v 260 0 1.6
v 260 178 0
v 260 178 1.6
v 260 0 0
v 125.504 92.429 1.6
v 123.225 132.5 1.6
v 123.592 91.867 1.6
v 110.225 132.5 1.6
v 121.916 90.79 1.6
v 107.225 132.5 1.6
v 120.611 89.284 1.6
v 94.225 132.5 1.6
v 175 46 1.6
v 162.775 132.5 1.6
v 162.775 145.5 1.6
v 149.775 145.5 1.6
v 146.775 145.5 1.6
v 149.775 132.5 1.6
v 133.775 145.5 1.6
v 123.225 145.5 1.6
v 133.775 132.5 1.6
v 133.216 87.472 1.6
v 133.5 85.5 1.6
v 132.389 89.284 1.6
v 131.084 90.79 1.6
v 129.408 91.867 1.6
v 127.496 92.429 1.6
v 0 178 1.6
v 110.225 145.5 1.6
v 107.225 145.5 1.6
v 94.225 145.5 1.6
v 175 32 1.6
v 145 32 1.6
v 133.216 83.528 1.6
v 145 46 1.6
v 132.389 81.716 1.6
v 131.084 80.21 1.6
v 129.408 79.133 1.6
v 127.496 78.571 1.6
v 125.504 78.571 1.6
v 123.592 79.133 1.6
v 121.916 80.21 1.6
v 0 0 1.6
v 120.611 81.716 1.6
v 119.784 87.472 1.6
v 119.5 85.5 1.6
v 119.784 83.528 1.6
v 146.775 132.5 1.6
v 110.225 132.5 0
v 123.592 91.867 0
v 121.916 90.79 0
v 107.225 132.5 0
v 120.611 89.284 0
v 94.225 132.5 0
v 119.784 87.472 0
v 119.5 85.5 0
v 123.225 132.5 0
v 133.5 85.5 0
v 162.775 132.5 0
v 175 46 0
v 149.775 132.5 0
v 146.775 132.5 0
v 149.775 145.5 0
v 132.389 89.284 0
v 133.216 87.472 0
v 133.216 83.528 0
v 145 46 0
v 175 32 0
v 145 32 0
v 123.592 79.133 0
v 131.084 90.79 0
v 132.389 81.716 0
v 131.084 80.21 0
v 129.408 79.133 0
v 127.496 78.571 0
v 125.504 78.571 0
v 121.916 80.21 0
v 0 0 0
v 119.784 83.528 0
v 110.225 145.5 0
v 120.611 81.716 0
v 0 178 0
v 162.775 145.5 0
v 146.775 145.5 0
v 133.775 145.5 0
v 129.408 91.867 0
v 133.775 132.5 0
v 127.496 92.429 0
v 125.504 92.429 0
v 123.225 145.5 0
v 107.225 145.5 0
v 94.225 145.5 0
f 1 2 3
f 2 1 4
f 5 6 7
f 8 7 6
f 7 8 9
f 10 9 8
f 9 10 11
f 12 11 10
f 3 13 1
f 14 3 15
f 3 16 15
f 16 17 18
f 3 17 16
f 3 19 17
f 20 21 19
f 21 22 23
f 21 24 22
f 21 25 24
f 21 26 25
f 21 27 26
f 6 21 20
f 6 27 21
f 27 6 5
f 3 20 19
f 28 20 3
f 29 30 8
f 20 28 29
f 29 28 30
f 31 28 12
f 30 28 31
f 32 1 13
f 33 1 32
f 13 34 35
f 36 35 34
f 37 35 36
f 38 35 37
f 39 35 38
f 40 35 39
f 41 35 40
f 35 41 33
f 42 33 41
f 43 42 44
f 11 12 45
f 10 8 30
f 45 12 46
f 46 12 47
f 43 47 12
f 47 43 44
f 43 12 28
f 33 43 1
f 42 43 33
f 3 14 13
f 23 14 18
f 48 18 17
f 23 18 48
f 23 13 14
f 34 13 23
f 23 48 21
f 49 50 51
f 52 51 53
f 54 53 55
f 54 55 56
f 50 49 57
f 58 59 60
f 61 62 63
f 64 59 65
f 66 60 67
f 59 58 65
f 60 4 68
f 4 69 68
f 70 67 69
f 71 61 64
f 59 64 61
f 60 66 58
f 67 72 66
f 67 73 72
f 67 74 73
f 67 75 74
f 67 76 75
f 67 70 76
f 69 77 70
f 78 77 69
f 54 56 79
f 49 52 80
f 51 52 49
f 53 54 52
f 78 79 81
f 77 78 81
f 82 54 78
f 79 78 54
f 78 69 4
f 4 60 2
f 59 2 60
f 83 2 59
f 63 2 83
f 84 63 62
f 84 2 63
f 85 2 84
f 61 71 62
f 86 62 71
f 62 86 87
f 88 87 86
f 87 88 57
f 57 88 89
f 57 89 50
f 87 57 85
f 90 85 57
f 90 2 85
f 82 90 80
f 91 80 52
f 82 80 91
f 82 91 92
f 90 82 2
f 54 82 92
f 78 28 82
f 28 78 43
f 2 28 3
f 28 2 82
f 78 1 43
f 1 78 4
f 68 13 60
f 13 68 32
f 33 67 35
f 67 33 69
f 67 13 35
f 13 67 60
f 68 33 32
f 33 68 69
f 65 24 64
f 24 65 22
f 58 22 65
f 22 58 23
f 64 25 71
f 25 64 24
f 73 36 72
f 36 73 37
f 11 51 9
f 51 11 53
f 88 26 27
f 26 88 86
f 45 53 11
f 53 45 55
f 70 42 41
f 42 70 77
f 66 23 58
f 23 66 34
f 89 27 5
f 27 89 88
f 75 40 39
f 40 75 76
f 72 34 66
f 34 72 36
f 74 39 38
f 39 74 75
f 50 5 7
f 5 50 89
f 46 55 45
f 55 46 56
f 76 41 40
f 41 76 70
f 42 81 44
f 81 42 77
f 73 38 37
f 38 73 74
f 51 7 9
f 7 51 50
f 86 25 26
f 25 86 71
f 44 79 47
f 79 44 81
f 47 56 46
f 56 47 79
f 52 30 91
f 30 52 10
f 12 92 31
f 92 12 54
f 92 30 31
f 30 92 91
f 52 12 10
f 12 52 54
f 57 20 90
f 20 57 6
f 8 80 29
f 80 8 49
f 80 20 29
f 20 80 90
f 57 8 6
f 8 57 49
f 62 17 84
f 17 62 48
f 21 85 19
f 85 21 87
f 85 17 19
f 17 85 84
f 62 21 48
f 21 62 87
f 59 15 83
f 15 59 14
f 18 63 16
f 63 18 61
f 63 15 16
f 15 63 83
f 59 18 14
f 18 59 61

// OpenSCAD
// All sizes are millimeters

// Global definitions
screw_cylinder_height = 8;
screw_cylinder_inner = 3;
screw_cylinder_outer = 4.5;

// Main plate 
surface_plate_width = 260;
surface_plate_height = 178;
surface_plate_thickness = 1.6;
surface_plate_xyz = [surface_plate_width,surface_plate_height, surface_plate_thickness];

// Display
display_width = 30;
display_height = 14;
display_thickness = 2;
display_size = [display_width, display_height, display_thickness];
display_distance_from_center_x = -30;
display_distance_from_center_y = 50;

// Volume knob
volume_knob_dia = 7;
volume_knob_position_x = (surface_plate_width / 2) - (volume_knob_dia / 2);
volume_knob_position_y = (surface_plate_height / 2) - (volume_knob_dia / 2);

// Button cuts
button_width = 13;
button_height = 13;
button_thickness = 2;
button_size = [button_width, button_height, button_thickness];
button_group_short_distance = 3;
button_group_big_distance = 13.55;
button_group_width_total = button_width * 4 + button_group_short_distance * 2 + button_group_big_distance;
button_group_position_x = (surface_plate_width / 2) - button_group_width_total / 2;
button_group_position_y = ((surface_plate_height / 2) - button_height / 2) + 50;

difference() {
    // Draw main plate
    cube(surface_plate_xyz);
    
    // Substract display
    translate ([surface_plate_width/2 - display_width /2 - 
    display_distance_from_center_x, 
    surface_plate_height/2 - display_height/2 - 
    display_distance_from_center_y])
    {
        cube(display_size);
    }
    
    // Substract volume knob
    translate([volume_knob_position_x, volume_knob_position_y]){
        cylinder(r=volume_knob_dia, h=2);
    }
    
    // Buttons
    translate([button_group_position_x, button_group_position_y])
    {
        cube(button_size);
    }
    
    translate([button_group_position_x + button_group_short_distance + button_width, button_group_position_y])
    {
        cube(button_size);
    }
    
    translate([button_group_position_x + button_group_big_distance + button_width * 2, button_group_position_y])
    {
        cube(button_size);
    }
    
    translate([button_group_position_x + button_group_short_distance + button_group_big_distance + button_width * 3, button_group_position_y])
    {
        cube(button_size);
    }
}

// draw screw holders display
/*translate ([surface_plate_width/2 - display_width /2 - 
    display_distance_from_center_x - 6, 
    surface_plate_height/2 - display_height/2 - 
    display_distance_from_center_y - 5]){
    difference(){
    cylinder(r=6, h=screw_cylinder_height);
        translate([screw_cylinder_outer/2 - screw_cylinder_inner /2]){
            cylinder(r=3, h=screw_cylinder_height);
        }
    }
}

translate ([surface_plate_width/2 - display_width /2 - 
    display_distance_from_center_x - 6, 
    surface_plate_height/2 + display_height/2 - 
    display_distance_from_center_y + 4]){
    difference(){
    cylinder(r=6, h=screw_cylinder_height);
        translate([screw_cylinder_outer/2 - screw_cylinder_inner /2]){
            cylinder(r=3, h=screw_cylinder_height);
        }
    }
}

translate ([surface_plate_width/2 + display_width /2 - 
    display_distance_from_center_x + 4, 
    surface_plate_height/2 + display_height/2 - 
    display_distance_from_center_y + 5]){
    difference(){
    cylinder(r=6, h=screw_cylinder_height);
        translate([screw_cylinder_outer/2 - screw_cylinder_inner /2]){
            cylinder(r=3, h=screw_cylinder_height);
        }
    }
}

translate ([surface_plate_width/2 + display_width /2 - 
    display_distance_from_center_x + 4, 
    surface_plate_height/2 - display_height/2 - 
    display_distance_from_center_y - 5]){
    difference(){
    cylinder(r=6, h=screw_cylinder_height);
        translate([screw_cylinder_outer/2 - screw_cylinder_inner /2]){
            cylinder(r=3, h=screw_cylinder_height);
        }
    }
}*/
